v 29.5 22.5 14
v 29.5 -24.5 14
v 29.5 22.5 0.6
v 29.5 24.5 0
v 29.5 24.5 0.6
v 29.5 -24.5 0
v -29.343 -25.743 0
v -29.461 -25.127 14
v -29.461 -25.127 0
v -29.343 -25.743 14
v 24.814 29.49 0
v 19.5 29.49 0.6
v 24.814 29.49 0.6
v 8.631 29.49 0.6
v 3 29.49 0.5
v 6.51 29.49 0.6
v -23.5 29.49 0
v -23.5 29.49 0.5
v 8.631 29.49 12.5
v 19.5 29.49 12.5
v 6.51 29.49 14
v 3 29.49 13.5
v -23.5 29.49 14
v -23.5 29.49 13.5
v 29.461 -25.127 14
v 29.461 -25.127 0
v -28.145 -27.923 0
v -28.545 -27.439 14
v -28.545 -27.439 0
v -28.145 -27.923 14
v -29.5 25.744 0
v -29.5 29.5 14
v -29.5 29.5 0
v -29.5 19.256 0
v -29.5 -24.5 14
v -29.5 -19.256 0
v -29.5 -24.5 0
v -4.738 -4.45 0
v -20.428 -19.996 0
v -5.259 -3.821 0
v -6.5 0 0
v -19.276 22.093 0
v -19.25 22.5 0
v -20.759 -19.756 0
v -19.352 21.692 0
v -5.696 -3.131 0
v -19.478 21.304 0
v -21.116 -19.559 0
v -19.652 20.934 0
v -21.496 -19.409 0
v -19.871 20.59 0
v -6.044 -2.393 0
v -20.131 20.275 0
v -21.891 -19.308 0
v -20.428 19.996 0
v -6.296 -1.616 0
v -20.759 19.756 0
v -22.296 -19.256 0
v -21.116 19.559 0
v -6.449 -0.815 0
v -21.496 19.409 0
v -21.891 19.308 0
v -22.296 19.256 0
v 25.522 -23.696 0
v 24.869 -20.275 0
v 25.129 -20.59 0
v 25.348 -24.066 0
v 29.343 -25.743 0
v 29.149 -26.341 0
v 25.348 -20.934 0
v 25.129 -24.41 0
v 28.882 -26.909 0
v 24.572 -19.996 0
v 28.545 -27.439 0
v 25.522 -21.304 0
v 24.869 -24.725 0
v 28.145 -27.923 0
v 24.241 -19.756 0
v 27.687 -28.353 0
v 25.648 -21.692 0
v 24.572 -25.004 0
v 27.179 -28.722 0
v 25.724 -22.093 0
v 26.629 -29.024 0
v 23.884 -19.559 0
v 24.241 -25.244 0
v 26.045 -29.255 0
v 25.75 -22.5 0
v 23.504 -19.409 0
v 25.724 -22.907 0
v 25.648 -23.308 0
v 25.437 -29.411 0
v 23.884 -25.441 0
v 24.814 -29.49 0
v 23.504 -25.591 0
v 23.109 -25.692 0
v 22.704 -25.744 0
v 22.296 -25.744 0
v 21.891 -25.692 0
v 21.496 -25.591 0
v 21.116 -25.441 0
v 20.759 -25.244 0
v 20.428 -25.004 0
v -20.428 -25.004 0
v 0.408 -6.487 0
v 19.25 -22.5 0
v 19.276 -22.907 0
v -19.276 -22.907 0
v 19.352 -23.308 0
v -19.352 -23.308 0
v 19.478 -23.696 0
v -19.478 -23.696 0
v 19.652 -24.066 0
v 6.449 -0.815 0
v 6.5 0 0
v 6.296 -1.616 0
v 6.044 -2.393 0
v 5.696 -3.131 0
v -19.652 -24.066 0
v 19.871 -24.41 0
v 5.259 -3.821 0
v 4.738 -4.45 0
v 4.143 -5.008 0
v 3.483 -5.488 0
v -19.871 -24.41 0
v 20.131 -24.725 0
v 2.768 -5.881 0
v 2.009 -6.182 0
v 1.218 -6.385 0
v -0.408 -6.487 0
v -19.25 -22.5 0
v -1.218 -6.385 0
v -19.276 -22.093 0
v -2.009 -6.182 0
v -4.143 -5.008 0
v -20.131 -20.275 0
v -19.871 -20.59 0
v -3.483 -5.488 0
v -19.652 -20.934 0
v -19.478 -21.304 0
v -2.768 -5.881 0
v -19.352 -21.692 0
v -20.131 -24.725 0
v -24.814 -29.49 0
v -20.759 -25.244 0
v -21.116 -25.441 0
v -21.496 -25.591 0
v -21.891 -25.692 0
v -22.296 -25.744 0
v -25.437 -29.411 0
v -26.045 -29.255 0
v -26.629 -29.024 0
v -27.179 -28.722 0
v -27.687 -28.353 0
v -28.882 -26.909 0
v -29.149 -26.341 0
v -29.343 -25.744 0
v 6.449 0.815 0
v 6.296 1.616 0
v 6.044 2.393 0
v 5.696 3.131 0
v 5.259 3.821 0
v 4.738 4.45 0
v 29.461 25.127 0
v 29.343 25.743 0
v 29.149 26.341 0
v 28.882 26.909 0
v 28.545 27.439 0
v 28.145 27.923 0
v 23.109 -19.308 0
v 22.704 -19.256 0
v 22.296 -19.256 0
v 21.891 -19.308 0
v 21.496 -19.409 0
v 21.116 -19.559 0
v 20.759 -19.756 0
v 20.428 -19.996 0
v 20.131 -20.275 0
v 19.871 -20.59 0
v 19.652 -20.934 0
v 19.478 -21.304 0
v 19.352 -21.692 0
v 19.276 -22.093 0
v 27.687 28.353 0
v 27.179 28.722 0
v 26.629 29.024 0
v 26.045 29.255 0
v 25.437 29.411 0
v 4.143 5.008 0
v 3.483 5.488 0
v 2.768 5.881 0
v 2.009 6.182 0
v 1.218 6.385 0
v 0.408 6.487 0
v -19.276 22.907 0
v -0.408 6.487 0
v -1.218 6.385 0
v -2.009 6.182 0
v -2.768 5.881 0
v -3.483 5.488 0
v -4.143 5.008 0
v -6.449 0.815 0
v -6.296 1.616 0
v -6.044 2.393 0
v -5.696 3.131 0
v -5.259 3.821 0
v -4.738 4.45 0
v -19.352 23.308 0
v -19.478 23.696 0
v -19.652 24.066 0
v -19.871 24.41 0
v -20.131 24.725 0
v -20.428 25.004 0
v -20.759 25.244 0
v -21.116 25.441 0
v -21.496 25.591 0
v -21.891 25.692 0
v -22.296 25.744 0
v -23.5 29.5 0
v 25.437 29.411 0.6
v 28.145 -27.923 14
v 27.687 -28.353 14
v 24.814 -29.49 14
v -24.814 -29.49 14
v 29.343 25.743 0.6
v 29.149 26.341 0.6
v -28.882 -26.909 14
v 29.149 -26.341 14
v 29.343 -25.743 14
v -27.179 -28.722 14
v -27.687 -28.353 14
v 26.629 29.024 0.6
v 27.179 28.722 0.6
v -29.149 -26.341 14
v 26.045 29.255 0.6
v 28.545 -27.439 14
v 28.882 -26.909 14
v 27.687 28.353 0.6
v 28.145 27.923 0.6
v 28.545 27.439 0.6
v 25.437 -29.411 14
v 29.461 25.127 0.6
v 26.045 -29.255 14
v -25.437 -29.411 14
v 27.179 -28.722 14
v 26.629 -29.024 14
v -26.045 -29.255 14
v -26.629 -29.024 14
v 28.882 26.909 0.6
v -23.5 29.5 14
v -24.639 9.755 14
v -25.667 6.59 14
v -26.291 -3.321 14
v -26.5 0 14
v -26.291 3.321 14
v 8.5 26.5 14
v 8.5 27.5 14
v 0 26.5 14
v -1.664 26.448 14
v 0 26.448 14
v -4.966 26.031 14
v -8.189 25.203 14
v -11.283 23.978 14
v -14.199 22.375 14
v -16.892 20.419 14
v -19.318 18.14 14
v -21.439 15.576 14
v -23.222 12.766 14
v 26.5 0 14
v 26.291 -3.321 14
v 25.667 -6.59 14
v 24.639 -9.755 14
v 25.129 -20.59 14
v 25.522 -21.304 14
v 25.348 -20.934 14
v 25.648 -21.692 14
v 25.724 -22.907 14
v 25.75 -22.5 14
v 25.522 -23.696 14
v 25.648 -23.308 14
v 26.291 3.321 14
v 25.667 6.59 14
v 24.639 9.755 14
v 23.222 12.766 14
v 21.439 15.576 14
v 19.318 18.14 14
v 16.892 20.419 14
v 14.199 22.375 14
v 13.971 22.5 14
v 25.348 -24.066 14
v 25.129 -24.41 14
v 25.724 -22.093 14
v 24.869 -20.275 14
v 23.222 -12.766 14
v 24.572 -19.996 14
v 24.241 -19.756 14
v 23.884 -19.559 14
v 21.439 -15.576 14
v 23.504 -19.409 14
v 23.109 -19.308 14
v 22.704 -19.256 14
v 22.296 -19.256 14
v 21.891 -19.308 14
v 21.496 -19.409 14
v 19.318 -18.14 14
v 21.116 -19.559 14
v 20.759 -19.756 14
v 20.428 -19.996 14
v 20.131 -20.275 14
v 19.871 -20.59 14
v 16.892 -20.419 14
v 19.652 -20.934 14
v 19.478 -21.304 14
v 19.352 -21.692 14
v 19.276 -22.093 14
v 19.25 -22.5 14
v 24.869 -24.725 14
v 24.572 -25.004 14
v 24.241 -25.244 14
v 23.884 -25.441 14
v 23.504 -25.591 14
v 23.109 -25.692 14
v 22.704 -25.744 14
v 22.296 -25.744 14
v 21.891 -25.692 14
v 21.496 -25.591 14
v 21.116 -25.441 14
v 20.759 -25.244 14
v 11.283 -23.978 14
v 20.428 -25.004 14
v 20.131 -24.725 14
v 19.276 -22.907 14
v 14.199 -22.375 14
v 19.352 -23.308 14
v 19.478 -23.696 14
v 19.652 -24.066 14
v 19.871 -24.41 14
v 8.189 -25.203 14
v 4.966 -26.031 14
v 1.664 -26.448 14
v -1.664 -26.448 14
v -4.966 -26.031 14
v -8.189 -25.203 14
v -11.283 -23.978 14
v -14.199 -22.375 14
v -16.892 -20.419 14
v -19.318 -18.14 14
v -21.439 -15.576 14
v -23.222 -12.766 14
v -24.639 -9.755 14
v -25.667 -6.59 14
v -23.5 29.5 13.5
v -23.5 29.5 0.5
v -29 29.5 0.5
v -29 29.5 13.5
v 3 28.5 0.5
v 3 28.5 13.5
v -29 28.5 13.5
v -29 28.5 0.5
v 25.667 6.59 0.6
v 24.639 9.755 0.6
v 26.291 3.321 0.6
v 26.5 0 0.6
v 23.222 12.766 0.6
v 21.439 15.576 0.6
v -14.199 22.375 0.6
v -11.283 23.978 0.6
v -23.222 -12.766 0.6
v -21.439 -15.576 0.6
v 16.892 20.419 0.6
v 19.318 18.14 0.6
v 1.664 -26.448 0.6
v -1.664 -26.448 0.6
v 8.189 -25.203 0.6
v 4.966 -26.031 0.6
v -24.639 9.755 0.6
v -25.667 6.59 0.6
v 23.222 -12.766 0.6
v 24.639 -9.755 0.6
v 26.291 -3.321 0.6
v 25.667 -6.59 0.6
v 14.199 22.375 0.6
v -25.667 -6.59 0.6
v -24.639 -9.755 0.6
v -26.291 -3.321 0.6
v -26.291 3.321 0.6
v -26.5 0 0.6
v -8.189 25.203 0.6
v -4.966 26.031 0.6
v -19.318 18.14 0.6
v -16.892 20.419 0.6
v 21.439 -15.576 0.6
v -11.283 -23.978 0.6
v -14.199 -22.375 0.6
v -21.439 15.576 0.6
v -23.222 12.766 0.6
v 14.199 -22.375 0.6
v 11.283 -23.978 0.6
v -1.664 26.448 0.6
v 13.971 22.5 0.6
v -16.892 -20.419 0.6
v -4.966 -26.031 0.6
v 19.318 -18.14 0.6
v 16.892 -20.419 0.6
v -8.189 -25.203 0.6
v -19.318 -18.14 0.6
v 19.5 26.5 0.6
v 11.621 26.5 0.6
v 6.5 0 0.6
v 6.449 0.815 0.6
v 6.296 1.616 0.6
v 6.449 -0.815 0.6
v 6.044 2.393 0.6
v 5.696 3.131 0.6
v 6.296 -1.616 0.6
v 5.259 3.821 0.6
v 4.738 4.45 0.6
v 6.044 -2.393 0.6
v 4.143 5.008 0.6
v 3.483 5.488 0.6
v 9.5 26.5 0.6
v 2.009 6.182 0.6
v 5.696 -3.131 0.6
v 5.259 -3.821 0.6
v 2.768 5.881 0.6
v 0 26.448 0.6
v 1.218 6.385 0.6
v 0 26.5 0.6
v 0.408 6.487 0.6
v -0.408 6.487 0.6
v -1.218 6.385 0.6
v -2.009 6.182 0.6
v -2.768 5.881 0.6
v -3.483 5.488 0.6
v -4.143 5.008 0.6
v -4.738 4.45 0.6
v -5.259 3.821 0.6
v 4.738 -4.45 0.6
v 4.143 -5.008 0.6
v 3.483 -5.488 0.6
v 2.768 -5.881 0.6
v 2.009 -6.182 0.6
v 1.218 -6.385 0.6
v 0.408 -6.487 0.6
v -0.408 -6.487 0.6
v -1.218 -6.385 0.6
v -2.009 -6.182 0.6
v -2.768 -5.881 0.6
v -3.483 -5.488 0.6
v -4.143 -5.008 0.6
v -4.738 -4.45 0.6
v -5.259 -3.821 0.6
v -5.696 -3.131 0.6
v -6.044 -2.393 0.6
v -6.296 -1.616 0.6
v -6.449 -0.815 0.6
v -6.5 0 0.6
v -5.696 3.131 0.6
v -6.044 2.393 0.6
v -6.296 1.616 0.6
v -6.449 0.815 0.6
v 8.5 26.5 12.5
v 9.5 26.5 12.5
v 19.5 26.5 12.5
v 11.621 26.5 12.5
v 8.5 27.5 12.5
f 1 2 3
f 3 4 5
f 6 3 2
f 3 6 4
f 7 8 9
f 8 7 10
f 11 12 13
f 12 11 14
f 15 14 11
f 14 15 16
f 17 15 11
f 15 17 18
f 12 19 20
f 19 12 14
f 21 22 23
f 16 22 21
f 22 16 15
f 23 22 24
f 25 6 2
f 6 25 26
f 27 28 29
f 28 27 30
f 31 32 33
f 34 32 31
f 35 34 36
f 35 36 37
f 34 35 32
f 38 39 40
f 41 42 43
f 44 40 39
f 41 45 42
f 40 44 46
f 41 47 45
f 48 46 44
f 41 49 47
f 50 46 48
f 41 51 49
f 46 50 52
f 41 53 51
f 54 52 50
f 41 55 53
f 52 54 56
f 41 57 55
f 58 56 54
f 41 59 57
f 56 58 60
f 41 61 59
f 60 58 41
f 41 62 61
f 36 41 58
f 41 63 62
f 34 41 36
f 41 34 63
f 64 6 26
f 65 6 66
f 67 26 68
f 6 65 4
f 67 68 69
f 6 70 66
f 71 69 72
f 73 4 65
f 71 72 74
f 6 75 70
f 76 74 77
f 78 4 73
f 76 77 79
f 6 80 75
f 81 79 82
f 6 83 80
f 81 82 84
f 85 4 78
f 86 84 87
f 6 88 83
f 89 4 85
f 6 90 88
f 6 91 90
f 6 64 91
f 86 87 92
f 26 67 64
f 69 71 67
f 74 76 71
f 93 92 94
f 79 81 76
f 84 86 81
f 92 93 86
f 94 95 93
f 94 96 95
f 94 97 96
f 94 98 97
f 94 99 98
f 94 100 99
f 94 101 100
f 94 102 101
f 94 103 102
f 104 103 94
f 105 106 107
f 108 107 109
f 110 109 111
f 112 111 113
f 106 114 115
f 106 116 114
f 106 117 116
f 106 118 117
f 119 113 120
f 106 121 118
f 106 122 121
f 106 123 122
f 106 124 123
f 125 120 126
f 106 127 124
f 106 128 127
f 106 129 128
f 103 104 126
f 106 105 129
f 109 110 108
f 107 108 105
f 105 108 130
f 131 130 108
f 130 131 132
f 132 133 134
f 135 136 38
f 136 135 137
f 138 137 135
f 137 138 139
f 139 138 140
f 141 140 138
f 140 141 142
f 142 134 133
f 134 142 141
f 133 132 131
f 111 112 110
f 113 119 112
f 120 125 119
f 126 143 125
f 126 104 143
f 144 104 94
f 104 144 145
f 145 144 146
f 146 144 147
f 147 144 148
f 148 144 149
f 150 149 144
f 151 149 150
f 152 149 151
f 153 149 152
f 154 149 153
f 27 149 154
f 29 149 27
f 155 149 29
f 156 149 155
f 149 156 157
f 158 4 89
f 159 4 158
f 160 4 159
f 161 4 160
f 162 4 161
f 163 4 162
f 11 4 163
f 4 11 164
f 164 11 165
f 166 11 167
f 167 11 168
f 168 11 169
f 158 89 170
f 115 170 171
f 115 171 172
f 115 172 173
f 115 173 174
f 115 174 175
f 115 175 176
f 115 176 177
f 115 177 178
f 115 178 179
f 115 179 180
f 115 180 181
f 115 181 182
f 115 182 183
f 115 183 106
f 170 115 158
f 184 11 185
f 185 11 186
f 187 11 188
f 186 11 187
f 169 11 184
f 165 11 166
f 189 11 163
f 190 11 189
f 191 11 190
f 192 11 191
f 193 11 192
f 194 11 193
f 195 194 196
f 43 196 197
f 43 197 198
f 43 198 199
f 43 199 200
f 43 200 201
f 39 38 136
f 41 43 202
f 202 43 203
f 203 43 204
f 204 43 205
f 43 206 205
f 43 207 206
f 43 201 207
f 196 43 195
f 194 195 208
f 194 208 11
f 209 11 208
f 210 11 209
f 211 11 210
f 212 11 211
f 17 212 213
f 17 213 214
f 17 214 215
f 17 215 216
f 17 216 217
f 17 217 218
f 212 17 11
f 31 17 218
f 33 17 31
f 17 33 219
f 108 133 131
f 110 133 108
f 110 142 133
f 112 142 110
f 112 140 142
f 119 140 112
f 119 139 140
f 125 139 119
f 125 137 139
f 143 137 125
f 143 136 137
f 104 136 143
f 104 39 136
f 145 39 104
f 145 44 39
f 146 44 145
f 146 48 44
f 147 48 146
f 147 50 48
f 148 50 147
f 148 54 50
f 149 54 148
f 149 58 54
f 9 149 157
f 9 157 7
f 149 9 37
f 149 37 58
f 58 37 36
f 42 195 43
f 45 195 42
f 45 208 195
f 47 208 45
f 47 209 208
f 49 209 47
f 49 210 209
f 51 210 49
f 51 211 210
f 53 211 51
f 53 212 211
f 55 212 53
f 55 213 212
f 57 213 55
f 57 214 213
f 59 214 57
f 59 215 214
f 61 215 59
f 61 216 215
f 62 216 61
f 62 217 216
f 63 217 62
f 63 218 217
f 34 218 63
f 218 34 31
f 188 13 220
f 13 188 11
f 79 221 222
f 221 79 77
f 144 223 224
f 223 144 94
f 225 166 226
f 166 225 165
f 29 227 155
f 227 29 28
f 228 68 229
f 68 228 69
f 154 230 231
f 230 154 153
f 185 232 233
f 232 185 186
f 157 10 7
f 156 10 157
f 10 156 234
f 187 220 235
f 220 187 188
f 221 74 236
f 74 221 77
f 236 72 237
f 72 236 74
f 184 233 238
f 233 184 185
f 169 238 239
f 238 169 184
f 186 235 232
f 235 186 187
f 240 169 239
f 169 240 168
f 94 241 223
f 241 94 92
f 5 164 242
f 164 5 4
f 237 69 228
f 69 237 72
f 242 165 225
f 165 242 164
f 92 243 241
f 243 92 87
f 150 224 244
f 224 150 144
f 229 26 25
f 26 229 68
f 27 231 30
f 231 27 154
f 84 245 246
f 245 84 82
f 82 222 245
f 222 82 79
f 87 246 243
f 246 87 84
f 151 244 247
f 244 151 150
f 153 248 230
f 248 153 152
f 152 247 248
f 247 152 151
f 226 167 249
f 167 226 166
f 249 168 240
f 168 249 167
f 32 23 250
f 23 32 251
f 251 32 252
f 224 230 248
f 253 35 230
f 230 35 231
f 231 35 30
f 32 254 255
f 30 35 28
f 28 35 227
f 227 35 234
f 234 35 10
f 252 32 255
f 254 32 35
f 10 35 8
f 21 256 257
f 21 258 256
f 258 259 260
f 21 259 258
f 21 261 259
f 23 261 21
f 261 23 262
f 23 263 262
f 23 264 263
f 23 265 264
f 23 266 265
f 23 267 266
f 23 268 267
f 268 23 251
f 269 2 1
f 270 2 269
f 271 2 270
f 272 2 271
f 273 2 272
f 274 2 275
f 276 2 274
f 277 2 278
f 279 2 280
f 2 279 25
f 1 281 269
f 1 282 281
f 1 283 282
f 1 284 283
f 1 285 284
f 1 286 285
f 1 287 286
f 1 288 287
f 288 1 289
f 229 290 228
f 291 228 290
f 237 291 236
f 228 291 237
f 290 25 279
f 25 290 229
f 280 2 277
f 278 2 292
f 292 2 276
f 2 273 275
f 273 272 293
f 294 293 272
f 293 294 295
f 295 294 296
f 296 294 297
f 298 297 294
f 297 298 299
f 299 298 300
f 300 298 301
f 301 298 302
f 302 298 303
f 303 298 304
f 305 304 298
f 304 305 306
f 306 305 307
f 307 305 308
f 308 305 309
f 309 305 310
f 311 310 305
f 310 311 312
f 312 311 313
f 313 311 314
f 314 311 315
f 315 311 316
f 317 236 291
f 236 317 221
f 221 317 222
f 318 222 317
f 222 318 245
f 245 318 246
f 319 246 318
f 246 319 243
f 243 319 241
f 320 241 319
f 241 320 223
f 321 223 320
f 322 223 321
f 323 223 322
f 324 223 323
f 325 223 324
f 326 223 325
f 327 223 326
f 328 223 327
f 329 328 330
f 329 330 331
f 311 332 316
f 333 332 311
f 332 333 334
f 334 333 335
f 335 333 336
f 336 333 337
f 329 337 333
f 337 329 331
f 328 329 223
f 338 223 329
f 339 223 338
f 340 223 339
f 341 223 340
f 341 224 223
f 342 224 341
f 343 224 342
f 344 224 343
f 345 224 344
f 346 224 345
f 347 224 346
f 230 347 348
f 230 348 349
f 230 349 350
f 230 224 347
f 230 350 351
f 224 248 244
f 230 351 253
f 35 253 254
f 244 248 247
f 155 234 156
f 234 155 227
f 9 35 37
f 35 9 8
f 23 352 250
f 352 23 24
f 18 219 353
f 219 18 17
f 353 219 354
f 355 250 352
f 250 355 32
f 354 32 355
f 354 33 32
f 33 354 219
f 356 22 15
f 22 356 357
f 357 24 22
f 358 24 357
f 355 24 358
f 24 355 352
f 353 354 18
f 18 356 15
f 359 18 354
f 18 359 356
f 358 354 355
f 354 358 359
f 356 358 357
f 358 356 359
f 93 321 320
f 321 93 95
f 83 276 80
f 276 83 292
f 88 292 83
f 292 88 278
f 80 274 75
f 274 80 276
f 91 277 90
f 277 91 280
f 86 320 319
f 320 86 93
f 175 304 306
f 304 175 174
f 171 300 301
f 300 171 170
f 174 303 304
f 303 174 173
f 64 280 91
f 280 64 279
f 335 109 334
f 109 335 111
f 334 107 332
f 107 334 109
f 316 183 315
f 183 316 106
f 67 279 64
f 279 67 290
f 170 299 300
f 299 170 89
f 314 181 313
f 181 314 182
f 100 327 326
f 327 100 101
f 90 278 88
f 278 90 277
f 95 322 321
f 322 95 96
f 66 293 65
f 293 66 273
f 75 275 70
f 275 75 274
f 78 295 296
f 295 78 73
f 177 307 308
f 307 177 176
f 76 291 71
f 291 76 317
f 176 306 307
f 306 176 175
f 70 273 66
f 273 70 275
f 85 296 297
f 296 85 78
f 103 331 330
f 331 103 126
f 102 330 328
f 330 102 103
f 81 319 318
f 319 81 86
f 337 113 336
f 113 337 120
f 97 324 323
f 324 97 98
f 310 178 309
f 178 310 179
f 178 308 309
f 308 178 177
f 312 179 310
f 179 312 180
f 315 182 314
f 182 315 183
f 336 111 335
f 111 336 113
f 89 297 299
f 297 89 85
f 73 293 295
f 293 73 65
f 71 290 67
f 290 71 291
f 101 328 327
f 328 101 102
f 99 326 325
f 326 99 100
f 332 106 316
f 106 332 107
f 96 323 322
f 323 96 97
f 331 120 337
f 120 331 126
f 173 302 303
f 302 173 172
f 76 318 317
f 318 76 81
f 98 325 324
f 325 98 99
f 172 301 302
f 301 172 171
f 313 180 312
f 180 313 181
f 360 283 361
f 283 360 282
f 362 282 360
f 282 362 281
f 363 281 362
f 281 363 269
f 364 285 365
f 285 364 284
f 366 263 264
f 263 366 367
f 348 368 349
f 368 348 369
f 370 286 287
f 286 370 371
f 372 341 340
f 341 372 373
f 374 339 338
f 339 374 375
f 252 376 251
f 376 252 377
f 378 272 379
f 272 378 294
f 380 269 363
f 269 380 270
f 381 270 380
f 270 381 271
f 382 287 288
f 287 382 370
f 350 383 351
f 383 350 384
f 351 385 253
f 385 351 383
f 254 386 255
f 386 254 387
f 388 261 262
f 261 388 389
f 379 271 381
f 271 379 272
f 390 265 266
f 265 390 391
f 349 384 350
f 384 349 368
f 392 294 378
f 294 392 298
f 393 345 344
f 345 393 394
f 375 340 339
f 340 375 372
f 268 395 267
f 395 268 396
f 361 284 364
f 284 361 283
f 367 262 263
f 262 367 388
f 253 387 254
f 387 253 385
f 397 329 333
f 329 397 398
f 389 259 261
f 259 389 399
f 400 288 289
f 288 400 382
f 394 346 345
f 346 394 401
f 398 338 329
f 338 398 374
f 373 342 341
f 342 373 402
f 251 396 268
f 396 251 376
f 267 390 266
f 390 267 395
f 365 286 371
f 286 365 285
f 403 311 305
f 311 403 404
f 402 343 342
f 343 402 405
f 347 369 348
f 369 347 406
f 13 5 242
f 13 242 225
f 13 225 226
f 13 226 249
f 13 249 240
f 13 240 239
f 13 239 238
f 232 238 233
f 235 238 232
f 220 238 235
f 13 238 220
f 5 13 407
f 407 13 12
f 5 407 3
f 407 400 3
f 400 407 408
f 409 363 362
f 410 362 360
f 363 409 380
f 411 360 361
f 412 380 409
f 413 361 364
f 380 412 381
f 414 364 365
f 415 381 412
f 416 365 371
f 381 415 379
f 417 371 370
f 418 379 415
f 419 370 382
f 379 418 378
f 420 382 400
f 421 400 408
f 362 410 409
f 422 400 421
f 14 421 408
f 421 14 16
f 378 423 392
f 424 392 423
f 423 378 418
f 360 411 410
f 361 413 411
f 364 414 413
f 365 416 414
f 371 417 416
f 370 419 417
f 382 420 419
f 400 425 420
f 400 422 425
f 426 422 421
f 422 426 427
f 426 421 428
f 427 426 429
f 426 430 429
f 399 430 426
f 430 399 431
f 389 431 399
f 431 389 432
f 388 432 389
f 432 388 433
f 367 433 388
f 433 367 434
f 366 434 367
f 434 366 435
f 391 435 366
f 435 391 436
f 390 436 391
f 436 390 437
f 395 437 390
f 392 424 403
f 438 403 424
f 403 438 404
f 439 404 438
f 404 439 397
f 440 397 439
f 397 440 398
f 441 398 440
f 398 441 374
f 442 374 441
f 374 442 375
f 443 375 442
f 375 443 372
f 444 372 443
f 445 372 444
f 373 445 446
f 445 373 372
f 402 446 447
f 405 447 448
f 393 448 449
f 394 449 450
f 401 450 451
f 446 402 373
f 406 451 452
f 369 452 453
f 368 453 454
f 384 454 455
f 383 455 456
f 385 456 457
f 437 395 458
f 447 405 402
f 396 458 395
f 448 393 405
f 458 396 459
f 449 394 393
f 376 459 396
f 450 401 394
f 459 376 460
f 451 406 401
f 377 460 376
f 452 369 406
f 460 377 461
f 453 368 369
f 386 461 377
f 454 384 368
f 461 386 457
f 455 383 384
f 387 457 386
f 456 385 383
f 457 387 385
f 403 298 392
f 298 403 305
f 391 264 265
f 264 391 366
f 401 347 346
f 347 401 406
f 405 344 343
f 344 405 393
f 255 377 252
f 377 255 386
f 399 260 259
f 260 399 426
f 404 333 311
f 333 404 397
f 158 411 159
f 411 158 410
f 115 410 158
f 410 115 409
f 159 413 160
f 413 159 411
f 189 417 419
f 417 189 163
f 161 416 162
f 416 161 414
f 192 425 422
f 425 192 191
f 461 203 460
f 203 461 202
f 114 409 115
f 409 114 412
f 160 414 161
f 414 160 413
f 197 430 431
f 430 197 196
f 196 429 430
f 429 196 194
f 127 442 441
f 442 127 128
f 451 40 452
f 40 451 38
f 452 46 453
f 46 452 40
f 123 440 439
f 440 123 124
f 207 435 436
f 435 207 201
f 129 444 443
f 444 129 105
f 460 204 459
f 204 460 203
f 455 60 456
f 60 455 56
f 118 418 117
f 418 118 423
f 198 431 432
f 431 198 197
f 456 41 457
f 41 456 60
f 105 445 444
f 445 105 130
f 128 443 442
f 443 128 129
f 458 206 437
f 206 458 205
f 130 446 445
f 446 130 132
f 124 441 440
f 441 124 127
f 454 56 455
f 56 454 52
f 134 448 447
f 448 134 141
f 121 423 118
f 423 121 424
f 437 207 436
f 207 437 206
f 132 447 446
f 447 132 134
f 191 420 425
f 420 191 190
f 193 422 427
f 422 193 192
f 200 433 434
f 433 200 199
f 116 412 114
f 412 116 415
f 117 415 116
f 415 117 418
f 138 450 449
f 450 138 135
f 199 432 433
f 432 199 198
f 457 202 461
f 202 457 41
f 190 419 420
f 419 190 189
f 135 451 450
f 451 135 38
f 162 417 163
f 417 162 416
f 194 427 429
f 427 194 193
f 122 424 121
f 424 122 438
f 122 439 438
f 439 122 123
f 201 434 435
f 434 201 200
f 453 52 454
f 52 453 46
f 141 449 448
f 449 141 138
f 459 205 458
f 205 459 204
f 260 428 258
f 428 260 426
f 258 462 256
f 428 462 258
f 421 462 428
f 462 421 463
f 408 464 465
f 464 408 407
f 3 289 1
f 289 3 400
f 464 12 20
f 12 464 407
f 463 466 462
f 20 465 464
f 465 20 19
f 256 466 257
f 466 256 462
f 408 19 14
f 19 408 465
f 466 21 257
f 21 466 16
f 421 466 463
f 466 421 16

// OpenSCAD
$fn = 50;


difference() {
	union() {
		hull() {
			translate(v = [-24.5000000000, 24.5000000000, 0]) {
				cylinder(h = 14, r = 5);
			}
			translate(v = [24.5000000000, 24.5000000000, 0]) {
				cylinder(h = 14, r = 5);
			}
			translate(v = [-24.5000000000, -24.5000000000, 0]) {
				cylinder(h = 14, r = 5);
			}
			translate(v = [24.5000000000, -24.5000000000, 0]) {
				cylinder(h = 14, r = 5);
			}
		}
		translate(v = [-29.5000000000, 23.5000000000, 0]) {
			cube(size = [6, 6, 14]);
		}
	}
	union() {
		translate(v = [-30.0000000000, -22.5000000000, -250.0000000000]) {
			rotate(a = [0, 0, 0]) {
				difference() {
					union() {
						hull() {
							translate(v = [7.5000000000, 0, 0]) {
								cylinder(h = 250, r = 3.2500000000, r1 = 3.2500000000, r2 = 3.2500000000);
							}
							translate(v = [-7.5000000000, 0, 0]) {
								cylinder(h = 250, r = 3.2500000000, r1 = 3.2500000000, r2 = 3.2500000000);
							}
						}
					}
					union();
				}
			}
		}
		translate(v = [-30.0000000000, 22.5000000000, -250.0000000000]) {
			rotate(a = [0, 0, 0]) {
				difference() {
					union() {
						hull() {
							translate(v = [7.5000000000, 0, 0]) {
								cylinder(h = 250, r = 3.2500000000, r1 = 3.2500000000, r2 = 3.2500000000);
							}
							translate(v = [-7.5000000000, 0, 0]) {
								cylinder(h = 250, r = 3.2500000000, r1 = 3.2500000000, r2 = 3.2500000000);
							}
						}
					}
					union();
				}
			}
		}
		translate(v = [-29.0000000000, 28.5000000000, 0.5000000000]) {
			cube(size = [32, 1, 13.0000000000]);
		}
		translate(v = [22.5000000000, -22.5000000000, -50.0000000000]) {
			cylinder(h = 100, r = 3.2500000000);
		}
		translate(v = [0, 0, 0.6000000000]) {
			cylinder(h = 16.4000000000, r = 26.5000000000);
		}
		translate(v = [0, 0, -7.0000000000]) {
			cylinder(h = 14, r = 6.5000000000);
		}
		translate(v = [0.0000000000, 22.5000000000, 0.6000000000]) {
			cube(size = [29.5000000000, 4, 16.4000000000]);
		}
		translate(v = [19.5000000000, 22.5000000000, 0.6000000000]) {
			cube(size = [10, 7, 16.4000000000]);
		}
		translate(v = [8.5000000000, 22.5000000000, 12.5000000000]) {
			cube(size = [21, 7, 1.5000000000]);
		}
		translate(v = [5.7500000000, 30.2500000000, 0.6000000000]) {
			rotate(a = [0, 0, -45]) {
				cube(size = [7.5000000000, 1.5000000000, 16.4000000000]);
			}
		}
		translate(v = [5.0610000000, 20.5000000000, 0.6000000000]) {
			cube(size = [7.5000000000, 2, 13.4000000000]);
		}
	}
}
